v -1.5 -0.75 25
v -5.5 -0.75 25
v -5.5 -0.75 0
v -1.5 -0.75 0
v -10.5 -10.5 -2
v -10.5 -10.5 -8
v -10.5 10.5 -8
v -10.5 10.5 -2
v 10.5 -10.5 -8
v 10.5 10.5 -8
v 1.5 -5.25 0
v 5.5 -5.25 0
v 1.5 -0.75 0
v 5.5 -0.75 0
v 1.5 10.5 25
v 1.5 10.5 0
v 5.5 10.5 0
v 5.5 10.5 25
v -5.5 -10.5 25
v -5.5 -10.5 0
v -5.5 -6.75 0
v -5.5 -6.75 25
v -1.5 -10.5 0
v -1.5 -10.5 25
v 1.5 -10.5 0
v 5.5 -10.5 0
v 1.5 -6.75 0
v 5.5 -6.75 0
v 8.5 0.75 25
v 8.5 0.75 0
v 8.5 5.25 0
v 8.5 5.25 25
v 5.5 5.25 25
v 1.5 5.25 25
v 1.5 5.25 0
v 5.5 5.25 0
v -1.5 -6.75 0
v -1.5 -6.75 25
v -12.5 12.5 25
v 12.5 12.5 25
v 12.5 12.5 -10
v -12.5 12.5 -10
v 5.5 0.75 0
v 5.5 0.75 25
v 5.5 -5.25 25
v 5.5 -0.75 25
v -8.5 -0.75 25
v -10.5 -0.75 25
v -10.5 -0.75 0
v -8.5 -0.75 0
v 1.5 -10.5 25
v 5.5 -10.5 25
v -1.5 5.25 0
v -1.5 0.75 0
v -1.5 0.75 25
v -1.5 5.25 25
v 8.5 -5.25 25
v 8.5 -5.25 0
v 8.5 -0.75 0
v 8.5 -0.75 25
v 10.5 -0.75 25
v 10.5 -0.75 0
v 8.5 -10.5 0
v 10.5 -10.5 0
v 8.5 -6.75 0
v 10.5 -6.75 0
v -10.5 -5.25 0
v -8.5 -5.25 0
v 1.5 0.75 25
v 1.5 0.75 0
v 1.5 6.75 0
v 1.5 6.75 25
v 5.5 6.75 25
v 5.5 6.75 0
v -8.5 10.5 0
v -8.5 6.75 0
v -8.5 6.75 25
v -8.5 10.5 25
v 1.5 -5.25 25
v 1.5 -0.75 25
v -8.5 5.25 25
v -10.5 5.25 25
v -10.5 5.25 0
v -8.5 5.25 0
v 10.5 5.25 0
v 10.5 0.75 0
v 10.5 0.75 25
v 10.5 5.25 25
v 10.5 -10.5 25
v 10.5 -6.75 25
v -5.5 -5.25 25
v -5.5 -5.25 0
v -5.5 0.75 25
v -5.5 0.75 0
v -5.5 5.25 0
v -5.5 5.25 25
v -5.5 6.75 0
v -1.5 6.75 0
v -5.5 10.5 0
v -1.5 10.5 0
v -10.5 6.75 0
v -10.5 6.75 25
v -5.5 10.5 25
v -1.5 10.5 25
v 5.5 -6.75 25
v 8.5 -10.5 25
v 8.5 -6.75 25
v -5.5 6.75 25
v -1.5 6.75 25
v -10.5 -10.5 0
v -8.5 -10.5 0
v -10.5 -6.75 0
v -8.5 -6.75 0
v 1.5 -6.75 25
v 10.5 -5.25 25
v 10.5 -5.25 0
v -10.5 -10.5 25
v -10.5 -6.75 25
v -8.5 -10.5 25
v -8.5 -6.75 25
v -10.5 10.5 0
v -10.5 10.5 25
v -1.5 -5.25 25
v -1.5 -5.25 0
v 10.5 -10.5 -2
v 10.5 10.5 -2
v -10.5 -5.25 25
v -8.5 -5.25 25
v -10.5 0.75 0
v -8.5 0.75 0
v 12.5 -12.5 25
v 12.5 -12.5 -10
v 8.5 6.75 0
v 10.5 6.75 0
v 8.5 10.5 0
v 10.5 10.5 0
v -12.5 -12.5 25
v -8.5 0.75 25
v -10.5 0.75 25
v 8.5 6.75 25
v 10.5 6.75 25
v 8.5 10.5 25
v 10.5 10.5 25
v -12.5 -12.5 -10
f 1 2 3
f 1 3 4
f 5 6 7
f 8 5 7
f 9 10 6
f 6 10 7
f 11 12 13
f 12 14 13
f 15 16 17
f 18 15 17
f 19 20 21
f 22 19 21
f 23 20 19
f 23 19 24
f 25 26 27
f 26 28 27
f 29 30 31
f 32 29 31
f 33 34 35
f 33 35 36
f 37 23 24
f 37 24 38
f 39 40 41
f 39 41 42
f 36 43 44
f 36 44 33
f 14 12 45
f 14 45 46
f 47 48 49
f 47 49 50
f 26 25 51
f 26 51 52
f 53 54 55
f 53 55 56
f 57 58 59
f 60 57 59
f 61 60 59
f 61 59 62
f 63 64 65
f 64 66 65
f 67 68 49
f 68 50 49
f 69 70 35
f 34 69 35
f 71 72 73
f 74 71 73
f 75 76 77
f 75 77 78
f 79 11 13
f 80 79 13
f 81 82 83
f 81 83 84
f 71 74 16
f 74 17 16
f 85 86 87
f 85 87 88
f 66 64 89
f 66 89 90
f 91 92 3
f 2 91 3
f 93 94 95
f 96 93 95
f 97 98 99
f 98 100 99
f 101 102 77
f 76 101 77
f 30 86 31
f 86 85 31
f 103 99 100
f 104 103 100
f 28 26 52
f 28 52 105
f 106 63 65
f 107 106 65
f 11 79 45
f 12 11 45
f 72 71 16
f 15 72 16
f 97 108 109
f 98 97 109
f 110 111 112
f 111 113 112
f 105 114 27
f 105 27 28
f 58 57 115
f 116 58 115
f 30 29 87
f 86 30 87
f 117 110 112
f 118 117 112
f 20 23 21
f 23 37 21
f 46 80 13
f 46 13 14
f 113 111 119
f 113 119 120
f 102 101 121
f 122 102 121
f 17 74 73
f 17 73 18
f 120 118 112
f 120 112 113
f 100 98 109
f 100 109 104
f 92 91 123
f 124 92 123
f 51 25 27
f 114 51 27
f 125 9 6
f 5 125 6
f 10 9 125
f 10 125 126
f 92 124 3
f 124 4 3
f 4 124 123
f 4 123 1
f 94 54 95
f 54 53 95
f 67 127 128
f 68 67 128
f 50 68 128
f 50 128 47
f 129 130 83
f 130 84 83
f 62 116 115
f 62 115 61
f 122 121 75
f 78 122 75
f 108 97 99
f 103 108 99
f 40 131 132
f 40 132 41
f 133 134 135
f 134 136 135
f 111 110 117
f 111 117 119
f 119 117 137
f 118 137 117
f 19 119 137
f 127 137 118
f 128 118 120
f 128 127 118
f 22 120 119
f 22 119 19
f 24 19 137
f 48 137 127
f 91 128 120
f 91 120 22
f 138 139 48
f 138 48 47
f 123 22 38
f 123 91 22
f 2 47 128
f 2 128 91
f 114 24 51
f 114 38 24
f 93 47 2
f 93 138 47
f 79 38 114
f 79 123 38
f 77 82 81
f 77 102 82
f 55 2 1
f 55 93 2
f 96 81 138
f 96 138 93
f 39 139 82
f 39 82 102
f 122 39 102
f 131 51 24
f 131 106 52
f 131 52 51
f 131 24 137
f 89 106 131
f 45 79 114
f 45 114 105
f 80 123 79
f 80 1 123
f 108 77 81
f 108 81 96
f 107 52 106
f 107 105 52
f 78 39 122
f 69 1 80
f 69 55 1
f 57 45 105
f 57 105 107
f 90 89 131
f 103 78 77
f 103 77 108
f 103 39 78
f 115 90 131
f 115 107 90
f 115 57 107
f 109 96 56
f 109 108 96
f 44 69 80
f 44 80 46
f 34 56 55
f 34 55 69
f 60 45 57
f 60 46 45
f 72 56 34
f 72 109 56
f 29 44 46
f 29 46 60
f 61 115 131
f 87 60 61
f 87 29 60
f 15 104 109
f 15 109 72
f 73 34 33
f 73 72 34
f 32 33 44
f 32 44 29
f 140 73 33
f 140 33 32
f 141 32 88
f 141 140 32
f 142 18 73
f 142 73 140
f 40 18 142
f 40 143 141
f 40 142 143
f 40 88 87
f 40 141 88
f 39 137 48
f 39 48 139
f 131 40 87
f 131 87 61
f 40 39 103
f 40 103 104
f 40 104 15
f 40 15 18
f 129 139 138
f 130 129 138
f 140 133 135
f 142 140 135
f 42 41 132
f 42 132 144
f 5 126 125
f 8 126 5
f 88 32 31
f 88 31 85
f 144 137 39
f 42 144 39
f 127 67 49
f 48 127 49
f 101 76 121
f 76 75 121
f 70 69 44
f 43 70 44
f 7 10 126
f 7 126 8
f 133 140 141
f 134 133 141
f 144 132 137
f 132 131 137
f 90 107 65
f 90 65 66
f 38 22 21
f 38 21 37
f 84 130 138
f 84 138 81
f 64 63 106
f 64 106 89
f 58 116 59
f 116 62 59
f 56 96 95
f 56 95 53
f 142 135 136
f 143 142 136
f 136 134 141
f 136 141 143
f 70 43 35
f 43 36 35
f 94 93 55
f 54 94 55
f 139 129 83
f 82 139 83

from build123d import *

# Parameters (mm, degrees)
SKETCH_8_W          = 25
SKETCH_8_H          = 25
SKETCH_8_W_2        = 4
SKETCH_8_H_2        = 21
SKETCH_8_W_3        = 2
EXTRUDE_7_DEPTH     = 25
SKETCH_9_W          = 25
SKETCH_9_H          = 25
EXTRUDE_8_DEPTH     = 2
SKETCH_11_W         = 25
SKETCH_11_H         = 25
EXTRUDE_9_DEPTH     = 6
SKETCH_12_W         = 21
SKETCH_12_H         = 21
CUT_EXTRUDE_1_DEPTH = 6
SKETCH_13_W         = 25
SKETCH_13_H         = 25
EXTRUDE_10_DEPTH    = 2
SKETCH_14_W         = 25
SKETCH_14_H         = 1.5
EXTRUDE_11_DEPTH    = 25


with BuildPart() as part:
    # 草图8 → 凸台-拉伸7 (new body)
    with BuildSketch(Plane.XY):
        Rectangle(SKETCH_8_W, SKETCH_8_H)
        with Locations((3.5, 0)):
            Rectangle(SKETCH_8_W_2, SKETCH_8_H_2, mode=Mode.SUBTRACT)
        with Locations((-3.5, 0)):
            Rectangle(SKETCH_8_W_2, SKETCH_8_H_2, mode=Mode.SUBTRACT)
        with Locations((-9.5, 0)):
            Rectangle(SKETCH_8_W_3, SKETCH_8_H_2, mode=Mode.SUBTRACT)
        with Locations((9.5, 0)):
            Rectangle(SKETCH_8_W_3, SKETCH_8_H_2, mode=Mode.SUBTRACT)
    extrude(amount=EXTRUDE_7_DEPTH)

    # 草图9 → 凸台-拉伸8 (add)
    with BuildSketch(Plane(origin=(0, 0, 0), x_dir=(-1, 0, 0), z_dir=(0, 0, -1))):
        Rectangle(SKETCH_9_W, SKETCH_9_H)
    extrude(amount=EXTRUDE_8_DEPTH)

    # 草图11 → 凸台-拉伸9 (add)
    with BuildSketch(Plane(origin=(0, 0, -2), x_dir=(-1, 0, 0), z_dir=(0, 0, -1))):
        Rectangle(SKETCH_11_W, SKETCH_11_H)
    extrude(amount=EXTRUDE_9_DEPTH)

    # 草图12 → 切除-拉伸1 (cut)
    with BuildSketch(Plane(origin=(0, 0, -8), x_dir=(-1, 0, 0), z_dir=(0, 0, -1))):
        Rectangle(SKETCH_12_W, SKETCH_12_H)
    extrude(amount=-CUT_EXTRUDE_1_DEPTH, mode=Mode.SUBTRACT)

    # 草图13 → 凸台-拉伸10 (add)
    with BuildSketch(Plane(origin=(0, 0, -8), x_dir=(-1, 0, 0), z_dir=(0, 0, -1))):
        Rectangle(SKETCH_13_W, SKETCH_13_H)
    extrude(amount=EXTRUDE_10_DEPTH)

    # 草图14 → 凸台-拉伸11 (add)
    with BuildSketch(Plane.XY.offset(25)):
        Rectangle(SKETCH_14_W, SKETCH_14_H)
        with Locations((0, 6)):
            Rectangle(SKETCH_14_W, SKETCH_14_H)
        with Locations((0, -6)):
            Rectangle(SKETCH_14_W, SKETCH_14_H)
    extrude(amount=-EXTRUDE_11_DEPTH)


solid = part.part
